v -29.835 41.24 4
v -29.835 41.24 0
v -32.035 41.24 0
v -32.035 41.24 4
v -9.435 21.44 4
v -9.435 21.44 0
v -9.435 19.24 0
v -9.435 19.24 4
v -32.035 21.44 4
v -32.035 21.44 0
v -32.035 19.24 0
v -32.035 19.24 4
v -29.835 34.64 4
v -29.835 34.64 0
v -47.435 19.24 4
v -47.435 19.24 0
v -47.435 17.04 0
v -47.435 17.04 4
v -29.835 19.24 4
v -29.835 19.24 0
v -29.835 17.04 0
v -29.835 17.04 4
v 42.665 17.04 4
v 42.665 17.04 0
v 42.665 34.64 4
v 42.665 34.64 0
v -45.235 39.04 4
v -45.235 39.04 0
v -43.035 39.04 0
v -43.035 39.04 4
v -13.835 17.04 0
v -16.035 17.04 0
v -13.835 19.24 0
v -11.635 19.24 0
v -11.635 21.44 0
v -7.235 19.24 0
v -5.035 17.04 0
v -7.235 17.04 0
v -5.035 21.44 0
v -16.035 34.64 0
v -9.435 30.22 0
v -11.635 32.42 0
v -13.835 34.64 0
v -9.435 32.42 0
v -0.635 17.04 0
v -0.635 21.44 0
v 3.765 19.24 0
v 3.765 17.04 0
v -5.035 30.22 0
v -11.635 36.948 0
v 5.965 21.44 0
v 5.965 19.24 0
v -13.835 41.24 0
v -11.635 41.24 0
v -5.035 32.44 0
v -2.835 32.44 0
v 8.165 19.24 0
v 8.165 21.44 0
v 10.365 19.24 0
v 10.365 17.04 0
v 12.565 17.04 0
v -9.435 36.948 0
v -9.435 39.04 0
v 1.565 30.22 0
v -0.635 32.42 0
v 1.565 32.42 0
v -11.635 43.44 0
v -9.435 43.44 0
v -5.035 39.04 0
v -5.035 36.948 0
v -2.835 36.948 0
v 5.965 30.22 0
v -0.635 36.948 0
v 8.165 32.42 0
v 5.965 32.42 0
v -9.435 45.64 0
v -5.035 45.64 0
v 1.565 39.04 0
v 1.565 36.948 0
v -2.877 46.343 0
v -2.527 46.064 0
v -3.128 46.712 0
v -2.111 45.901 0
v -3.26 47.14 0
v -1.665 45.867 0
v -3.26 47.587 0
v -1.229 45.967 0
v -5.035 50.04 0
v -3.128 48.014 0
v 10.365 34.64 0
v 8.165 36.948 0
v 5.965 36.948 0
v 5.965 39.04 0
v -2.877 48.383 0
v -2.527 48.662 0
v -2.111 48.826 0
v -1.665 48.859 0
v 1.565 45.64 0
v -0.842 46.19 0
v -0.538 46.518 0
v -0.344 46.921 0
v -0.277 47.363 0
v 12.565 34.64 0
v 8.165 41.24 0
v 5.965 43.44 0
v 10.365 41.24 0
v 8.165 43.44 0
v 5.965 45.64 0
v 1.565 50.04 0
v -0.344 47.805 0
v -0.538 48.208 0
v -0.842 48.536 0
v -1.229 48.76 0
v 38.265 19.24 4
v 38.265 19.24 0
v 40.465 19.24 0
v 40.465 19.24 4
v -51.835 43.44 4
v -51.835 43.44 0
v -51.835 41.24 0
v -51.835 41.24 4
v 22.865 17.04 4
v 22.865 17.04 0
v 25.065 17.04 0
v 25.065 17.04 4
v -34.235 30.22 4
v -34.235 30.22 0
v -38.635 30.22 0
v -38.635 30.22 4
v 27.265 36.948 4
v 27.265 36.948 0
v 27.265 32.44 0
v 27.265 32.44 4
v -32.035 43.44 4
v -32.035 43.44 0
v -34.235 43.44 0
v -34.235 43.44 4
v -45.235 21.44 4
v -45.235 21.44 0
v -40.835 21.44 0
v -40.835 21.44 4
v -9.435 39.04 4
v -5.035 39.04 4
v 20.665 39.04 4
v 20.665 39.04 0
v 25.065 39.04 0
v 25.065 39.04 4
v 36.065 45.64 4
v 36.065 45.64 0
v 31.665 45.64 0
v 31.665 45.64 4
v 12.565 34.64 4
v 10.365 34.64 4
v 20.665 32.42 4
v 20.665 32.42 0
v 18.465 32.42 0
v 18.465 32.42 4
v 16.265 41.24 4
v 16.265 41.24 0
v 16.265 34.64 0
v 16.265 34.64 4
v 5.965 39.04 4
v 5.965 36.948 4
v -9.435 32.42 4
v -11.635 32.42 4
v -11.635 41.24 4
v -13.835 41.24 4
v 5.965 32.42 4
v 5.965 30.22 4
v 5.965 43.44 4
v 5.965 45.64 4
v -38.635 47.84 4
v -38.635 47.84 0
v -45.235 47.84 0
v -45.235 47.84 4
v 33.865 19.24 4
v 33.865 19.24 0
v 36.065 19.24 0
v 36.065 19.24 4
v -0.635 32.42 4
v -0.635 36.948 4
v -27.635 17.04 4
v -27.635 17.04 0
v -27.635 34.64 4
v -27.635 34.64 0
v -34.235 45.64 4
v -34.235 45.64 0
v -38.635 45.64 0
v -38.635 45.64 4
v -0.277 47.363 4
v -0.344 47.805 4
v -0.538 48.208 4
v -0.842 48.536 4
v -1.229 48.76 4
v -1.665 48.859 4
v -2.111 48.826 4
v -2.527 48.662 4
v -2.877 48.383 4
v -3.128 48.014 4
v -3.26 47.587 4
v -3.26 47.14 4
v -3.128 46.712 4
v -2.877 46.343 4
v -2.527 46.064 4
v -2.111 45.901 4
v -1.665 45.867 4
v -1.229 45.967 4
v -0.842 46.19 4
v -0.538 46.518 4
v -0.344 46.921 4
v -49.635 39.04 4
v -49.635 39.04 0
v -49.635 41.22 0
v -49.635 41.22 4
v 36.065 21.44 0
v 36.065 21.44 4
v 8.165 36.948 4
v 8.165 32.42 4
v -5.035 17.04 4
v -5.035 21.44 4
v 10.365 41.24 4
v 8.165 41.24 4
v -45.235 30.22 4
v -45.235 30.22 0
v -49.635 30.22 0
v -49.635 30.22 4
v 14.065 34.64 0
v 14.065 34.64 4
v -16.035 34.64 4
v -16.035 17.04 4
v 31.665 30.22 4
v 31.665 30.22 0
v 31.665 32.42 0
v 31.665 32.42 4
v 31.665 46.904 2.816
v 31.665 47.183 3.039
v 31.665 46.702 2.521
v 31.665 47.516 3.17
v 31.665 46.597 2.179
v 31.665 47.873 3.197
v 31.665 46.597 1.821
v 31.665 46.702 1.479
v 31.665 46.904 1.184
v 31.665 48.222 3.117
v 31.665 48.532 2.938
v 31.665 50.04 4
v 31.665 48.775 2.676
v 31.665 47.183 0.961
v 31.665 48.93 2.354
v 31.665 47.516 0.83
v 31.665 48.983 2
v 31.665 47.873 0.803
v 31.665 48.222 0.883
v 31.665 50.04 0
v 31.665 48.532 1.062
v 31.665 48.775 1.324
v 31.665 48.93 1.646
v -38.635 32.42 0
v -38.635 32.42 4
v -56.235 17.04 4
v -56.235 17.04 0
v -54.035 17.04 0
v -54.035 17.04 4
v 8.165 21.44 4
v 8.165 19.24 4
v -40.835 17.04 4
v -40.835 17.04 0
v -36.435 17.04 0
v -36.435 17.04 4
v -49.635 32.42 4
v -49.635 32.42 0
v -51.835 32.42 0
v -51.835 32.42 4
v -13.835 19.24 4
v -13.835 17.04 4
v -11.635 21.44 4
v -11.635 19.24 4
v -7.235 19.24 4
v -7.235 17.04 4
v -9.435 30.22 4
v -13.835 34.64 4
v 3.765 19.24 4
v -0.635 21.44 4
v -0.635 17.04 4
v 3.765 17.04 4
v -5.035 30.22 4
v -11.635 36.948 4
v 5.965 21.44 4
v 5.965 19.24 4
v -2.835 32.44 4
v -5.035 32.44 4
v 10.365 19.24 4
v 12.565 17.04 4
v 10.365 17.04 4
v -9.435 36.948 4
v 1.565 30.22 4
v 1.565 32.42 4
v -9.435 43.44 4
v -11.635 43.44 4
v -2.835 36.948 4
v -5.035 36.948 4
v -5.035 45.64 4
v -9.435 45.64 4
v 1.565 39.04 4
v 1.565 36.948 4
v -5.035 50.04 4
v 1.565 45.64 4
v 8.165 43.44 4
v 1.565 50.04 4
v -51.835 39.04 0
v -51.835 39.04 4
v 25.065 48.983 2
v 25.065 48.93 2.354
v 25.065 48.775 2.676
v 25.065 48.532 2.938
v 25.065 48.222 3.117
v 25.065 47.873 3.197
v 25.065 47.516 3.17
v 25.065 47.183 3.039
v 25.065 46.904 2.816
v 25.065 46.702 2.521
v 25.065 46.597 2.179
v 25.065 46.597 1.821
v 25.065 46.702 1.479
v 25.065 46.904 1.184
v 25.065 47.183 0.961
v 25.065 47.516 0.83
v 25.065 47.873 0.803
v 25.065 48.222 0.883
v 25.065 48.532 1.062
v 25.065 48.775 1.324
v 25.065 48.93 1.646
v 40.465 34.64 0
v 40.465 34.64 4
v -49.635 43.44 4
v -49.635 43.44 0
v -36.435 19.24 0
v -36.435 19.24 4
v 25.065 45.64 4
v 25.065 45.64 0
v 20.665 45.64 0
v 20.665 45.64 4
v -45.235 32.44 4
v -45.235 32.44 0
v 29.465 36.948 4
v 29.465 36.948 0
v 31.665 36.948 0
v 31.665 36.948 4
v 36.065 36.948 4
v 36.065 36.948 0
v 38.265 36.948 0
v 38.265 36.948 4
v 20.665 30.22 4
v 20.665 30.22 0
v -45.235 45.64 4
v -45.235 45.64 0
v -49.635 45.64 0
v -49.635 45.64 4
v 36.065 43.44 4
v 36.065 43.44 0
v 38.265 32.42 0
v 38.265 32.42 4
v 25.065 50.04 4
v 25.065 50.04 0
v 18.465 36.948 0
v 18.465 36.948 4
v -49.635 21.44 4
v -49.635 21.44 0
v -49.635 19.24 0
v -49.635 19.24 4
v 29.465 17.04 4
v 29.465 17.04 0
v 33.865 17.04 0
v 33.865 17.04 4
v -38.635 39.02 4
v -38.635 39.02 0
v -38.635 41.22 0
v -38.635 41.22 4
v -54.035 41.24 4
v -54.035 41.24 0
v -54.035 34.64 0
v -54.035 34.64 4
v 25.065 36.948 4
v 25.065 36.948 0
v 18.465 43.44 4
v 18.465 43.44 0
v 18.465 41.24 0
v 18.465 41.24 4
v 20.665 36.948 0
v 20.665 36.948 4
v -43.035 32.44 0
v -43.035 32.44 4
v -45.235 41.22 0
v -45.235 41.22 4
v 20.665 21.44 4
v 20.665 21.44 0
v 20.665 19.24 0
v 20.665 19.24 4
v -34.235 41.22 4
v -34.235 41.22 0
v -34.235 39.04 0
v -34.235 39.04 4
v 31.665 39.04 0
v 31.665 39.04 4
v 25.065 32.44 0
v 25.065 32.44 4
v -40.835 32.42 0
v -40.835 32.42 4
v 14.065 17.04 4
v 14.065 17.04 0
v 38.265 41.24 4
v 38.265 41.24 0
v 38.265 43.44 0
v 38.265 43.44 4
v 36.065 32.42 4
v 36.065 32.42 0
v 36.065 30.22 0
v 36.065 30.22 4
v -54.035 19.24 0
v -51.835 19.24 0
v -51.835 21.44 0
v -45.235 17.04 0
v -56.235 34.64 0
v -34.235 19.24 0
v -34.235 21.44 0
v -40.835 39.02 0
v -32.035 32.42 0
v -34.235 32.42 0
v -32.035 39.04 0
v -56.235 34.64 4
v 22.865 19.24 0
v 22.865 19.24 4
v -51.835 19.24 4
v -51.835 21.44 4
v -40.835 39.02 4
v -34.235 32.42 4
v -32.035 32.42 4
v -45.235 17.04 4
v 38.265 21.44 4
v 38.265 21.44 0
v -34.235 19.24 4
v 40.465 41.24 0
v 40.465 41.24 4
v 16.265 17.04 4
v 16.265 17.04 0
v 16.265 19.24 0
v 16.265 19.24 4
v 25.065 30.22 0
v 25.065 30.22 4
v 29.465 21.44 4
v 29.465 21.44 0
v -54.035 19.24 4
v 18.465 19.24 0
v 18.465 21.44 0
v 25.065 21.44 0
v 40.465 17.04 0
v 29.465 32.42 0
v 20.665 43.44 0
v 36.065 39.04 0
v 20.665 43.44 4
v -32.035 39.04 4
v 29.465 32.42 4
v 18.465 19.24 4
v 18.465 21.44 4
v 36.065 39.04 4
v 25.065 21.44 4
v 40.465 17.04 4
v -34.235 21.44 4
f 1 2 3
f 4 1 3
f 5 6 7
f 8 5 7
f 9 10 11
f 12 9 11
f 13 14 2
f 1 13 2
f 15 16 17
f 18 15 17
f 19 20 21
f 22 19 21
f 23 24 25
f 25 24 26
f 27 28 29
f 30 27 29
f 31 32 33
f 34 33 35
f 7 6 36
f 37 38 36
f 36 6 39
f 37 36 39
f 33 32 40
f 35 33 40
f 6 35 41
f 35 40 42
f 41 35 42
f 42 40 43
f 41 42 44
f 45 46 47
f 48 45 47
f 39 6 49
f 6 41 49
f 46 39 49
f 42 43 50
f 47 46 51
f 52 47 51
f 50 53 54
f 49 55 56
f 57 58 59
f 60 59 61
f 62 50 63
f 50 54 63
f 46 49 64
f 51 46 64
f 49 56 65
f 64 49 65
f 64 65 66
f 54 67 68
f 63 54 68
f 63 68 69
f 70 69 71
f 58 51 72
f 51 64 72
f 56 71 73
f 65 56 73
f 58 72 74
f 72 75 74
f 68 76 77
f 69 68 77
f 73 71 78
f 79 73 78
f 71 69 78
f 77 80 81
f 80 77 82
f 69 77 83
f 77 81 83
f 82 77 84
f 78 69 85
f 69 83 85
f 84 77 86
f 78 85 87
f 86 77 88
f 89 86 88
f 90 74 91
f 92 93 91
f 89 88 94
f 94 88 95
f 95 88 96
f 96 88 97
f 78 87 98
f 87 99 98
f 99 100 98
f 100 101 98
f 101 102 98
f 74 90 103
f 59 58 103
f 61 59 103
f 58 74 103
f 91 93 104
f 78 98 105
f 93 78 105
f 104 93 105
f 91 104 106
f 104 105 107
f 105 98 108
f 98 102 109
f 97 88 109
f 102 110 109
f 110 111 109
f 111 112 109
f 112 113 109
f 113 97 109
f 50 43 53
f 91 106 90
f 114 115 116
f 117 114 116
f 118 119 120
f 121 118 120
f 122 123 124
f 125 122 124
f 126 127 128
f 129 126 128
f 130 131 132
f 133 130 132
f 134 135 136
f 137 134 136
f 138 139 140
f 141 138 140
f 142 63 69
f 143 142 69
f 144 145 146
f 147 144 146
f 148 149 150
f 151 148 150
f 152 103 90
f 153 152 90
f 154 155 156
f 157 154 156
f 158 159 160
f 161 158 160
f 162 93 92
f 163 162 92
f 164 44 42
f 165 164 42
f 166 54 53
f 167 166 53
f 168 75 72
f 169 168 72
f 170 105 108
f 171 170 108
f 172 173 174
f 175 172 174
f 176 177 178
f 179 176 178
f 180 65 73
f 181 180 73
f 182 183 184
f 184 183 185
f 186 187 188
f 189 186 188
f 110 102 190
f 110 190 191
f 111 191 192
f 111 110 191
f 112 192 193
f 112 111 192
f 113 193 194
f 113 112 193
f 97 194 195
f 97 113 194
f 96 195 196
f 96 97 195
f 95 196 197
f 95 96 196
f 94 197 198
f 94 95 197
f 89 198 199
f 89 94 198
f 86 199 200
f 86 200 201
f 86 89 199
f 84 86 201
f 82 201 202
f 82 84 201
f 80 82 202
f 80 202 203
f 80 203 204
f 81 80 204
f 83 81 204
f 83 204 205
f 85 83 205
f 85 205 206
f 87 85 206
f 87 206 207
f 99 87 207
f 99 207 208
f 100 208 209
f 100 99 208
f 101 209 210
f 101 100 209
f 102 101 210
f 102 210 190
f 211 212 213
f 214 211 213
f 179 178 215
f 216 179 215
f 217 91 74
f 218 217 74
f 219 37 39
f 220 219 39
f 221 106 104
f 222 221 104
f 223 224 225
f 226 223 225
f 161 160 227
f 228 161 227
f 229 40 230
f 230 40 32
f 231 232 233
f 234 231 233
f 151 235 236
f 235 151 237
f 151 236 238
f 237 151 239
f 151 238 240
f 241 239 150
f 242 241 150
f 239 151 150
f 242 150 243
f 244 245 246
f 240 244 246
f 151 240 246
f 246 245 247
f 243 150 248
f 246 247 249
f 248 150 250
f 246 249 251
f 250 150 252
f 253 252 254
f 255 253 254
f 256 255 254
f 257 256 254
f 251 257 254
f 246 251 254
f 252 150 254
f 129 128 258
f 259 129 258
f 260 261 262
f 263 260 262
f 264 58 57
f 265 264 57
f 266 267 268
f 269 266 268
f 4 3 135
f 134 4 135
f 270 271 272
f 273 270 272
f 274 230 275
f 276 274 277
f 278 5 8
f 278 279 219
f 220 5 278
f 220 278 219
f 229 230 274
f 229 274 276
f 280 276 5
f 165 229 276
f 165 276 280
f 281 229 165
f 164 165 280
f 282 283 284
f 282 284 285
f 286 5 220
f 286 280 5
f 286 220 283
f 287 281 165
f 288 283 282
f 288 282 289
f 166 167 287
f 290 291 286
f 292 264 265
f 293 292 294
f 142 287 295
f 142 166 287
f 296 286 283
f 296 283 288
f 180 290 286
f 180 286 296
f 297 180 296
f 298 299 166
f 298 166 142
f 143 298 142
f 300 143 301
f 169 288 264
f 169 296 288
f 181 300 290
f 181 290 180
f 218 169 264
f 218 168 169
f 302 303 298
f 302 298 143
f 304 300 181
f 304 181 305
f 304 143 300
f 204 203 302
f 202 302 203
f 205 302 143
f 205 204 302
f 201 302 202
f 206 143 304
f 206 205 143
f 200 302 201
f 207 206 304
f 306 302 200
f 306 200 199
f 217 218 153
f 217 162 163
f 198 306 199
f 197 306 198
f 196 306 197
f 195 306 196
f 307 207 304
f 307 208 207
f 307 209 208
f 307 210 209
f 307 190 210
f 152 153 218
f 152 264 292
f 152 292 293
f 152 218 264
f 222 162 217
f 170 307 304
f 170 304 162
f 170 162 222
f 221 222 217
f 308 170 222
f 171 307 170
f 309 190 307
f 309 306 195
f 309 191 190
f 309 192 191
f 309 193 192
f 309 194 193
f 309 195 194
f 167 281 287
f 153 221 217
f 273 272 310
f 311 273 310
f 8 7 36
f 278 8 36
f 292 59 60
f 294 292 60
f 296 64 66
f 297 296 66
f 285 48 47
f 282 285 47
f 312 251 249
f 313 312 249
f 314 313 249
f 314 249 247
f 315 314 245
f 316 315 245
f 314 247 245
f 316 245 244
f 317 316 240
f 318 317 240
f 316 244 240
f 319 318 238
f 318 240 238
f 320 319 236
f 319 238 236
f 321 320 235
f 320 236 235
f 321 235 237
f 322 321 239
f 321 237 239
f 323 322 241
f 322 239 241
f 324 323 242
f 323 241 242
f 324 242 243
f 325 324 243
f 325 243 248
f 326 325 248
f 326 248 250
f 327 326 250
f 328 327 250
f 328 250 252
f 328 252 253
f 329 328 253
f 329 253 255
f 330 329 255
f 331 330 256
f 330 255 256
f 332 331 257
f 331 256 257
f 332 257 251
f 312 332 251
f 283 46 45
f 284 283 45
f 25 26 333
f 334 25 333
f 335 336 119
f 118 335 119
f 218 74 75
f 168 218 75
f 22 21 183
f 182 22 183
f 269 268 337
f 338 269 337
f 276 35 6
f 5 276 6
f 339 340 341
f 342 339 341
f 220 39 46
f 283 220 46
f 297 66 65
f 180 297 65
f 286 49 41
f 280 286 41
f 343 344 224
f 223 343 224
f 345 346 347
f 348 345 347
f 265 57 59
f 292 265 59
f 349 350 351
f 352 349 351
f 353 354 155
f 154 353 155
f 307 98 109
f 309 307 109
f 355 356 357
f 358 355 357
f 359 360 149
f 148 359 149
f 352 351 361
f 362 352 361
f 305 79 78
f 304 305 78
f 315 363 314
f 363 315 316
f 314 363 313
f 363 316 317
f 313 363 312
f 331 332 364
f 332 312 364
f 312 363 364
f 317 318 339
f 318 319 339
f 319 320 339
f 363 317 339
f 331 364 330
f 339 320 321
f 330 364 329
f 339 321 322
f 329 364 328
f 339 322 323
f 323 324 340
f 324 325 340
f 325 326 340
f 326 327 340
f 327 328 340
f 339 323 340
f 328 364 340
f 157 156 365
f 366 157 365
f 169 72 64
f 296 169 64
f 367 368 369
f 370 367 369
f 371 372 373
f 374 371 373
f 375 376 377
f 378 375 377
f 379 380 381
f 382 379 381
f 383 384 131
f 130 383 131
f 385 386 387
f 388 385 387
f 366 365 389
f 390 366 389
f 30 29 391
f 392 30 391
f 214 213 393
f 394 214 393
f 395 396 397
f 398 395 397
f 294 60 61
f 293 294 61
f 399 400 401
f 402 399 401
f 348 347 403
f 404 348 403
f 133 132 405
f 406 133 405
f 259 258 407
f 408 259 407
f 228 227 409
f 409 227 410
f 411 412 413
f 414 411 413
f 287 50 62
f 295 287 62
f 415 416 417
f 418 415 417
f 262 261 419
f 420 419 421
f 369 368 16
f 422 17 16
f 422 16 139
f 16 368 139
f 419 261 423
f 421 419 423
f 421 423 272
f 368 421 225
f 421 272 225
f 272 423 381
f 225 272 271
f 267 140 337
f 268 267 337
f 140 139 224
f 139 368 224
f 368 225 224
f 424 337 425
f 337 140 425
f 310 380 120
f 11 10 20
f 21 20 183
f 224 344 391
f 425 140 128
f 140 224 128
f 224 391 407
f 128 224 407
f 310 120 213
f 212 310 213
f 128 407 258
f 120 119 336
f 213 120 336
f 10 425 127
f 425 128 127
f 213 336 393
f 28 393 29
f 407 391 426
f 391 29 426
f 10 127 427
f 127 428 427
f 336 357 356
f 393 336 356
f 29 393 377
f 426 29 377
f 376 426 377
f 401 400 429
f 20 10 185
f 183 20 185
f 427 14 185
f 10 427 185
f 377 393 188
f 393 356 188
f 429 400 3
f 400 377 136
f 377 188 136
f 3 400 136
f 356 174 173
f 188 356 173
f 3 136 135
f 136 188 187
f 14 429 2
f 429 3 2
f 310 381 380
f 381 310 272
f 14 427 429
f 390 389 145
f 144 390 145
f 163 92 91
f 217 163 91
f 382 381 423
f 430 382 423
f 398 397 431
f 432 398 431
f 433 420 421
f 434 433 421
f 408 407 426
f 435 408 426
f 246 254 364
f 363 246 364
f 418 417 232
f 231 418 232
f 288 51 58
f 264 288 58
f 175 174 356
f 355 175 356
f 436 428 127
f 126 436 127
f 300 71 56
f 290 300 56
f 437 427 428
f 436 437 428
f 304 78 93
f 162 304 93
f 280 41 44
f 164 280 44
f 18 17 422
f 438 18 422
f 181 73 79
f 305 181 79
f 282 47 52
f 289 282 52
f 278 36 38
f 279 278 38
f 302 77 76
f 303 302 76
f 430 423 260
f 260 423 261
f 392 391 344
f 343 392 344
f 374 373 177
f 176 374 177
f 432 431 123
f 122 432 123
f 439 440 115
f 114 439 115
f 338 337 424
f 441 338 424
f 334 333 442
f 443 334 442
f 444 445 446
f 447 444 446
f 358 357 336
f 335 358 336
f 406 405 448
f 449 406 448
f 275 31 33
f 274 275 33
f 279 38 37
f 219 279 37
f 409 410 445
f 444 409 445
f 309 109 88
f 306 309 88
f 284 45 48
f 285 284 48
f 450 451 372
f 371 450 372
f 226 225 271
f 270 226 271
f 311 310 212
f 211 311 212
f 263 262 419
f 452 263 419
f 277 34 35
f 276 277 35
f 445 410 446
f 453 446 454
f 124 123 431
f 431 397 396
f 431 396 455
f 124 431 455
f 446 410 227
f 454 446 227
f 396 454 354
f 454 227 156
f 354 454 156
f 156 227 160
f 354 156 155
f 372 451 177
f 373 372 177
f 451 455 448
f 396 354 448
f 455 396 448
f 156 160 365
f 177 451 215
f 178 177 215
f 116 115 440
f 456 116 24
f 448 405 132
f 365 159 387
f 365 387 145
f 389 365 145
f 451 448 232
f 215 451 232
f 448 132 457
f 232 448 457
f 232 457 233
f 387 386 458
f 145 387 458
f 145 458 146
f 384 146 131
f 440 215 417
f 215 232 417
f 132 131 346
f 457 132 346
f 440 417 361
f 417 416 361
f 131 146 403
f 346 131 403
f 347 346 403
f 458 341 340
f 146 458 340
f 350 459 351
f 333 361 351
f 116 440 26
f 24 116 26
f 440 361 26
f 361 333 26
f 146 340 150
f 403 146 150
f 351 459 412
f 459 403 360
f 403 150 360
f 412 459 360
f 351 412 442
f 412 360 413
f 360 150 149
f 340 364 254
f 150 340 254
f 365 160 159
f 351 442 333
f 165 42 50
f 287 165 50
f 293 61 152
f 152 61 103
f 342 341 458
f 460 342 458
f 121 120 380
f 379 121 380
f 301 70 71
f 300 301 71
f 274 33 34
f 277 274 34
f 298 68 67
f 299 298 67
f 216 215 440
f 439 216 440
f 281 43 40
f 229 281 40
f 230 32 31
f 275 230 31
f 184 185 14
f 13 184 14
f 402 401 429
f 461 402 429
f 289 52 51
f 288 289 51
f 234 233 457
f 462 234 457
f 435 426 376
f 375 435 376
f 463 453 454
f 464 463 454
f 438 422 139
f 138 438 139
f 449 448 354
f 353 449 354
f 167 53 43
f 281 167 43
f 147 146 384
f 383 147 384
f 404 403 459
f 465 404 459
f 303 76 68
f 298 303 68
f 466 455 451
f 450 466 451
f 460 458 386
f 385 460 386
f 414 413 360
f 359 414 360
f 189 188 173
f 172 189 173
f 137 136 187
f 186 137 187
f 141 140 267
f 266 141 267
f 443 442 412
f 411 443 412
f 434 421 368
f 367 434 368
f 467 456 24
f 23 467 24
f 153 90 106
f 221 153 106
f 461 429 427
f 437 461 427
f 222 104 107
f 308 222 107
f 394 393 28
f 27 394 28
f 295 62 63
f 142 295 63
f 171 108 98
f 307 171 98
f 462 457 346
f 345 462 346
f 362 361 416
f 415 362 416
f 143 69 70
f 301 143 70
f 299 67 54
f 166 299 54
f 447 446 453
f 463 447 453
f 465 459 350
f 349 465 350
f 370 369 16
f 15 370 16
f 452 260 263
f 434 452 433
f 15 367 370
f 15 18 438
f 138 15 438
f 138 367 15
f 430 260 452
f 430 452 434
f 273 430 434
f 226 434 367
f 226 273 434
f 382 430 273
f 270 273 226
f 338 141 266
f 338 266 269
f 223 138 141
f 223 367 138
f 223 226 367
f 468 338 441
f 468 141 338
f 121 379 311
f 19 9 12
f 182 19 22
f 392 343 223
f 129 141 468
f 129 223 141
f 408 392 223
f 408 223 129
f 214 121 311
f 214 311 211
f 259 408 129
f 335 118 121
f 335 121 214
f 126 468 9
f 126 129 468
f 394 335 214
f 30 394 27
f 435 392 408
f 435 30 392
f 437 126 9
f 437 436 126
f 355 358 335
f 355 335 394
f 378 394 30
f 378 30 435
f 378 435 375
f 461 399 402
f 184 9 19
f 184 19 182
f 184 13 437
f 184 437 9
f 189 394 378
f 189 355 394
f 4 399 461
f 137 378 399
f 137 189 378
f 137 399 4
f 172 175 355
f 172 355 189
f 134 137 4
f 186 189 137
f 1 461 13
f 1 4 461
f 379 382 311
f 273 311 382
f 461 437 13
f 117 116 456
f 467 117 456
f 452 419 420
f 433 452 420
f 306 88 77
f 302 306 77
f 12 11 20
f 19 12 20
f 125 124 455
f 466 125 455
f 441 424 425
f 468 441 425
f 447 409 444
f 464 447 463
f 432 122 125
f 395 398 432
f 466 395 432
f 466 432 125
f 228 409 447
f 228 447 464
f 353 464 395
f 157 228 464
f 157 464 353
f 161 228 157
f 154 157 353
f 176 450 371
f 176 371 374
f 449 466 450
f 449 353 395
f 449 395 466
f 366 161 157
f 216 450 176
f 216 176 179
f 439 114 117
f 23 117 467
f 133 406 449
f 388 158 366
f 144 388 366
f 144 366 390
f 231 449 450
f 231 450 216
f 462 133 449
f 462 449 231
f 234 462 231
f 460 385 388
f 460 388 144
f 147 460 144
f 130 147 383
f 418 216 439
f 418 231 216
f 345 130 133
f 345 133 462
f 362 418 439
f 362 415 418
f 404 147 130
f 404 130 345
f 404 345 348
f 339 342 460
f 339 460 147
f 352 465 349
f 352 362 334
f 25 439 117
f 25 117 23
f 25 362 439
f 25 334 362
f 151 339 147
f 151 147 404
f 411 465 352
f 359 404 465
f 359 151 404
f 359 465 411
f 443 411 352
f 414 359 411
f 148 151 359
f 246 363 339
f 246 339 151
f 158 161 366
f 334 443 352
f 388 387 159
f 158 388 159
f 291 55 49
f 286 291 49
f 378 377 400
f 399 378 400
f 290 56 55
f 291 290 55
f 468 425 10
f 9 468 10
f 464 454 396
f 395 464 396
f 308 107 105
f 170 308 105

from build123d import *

# Parameters (mm, degrees)
F1_DEPTH = 4
F0_R     = 1.5
F2_R     = 1.2
F3_DEPTH = 6.6


with BuildPart() as f1:
    # F0 (on Top) → F1 (new body)
    with BuildSketch(Plane.XY):
        Polygon((-49.635447526, 43.4403642893), (-51.835447526, 43.4403642893), (-51.835447526, 41.2403642893), (-54.035447526, 41.2403642893), (-54.035447526, 34.6403642893), (-56.235447526, 34.6403642893), (-56.235447526, 17.0403642893), (-54.035447526, 17.0403642893), (-54.035447526, 19.2403642893), (-51.835447526, 19.2403642893), (-51.835447526, 21.4403642893), (-49.635447526, 21.4403642893), (-49.635447526, 19.2403642893), (-47.435447526, 19.2403642893), (-47.435447526, 17.0403642893), (-45.235447526, 17.0403642893), (-45.235447526, 21.4403642893), (-40.835447526, 21.4403642893), (-40.835447526, 17.0403642893), (-36.435447526, 17.0403642893), (-36.435447526, 19.2403642893), (-34.235447526, 19.2403642893), (-34.235447526, 21.4403642893), (-32.035447526, 21.4403642893), (-32.035447526, 19.2403642893), (-29.835447526, 19.2403642893), (-29.835447526, 17.0403642893), (-27.635447526, 17.0403642893), (-27.635447526, 34.6403642893), (-29.835447526, 34.6403642893), (-29.835447526, 41.2403642893), (-32.035447526, 41.2403642893), (-32.035447526, 43.4403642893), (-34.235447526, 43.4403642893), (-34.235447526, 45.6403642893), (-38.635447526, 45.6403642893), (-38.635447526, 47.8403642893), (-45.235447526, 47.8403642893), (-45.235447526, 45.6403642893), (-49.635447526, 45.6403642893), align=None)
        Polygon((-45.235447526, 41.2196852863), (-45.235447526, 39.0403642893), (-43.035447526, 39.0403642893), (-43.035447526, 39.0196852863), (-43.035447526, 32.4403642893), (-45.235447526, 32.4403642893), (-45.235447526, 30.2196852863), (-49.635447526, 30.2196852863), (-49.635447526, 32.4196852863), (-51.835447526, 32.4196852863), (-51.835447526, 32.4403642893), (-51.835447526, 39.0196852863), (-51.835447526, 39.0403642893), (-49.635447526, 39.0403642893), (-49.635447526, 41.2196852863), align=None, mode=Mode.SUBTRACT)
        Polygon((-34.235447526, 39.0403642893), (-32.035447526, 39.0403642893), (-32.035447526, 39.0196852863), (-32.035447526, 32.4403642893), (-32.035447526, 32.4196852863), (-34.235447526, 32.4196852863), (-34.235447526, 30.2196852863), (-38.635447526, 30.2196852863), (-38.635447526, 32.4196852863), (-40.835447526, 32.4196852863), (-40.835447526, 39.0196852863), (-38.635447526, 39.0196852863), (-38.635447526, 39.0403642893), (-38.635447526, 41.2196852863), (-34.235447526, 41.2196852863), align=None, mode=Mode.SUBTRACT)
    extrude(amount=F1_DEPTH)


with BuildPart() as f1b:
    # F0 (on Top) → F1, piece 2 (new body)
    with BuildSketch(Plane.XY):
        Polygon((-9.4354487598, 43.4403642893), (-11.6354487598, 43.4403642893), (-11.6354487598, 41.2403642893), (-13.8354487598, 41.2403642893), (-13.8354487598, 34.6403642893), (-16.0354487598, 34.6403642893), (-16.0354487598, 17.0403642893), (-13.8354487598, 17.0403642893), (-13.8354487598, 19.2403642893), (-11.6354487598, 19.2403642893), (-11.6354487598, 21.4403642893), (-9.4354487598, 21.4403642893), (-9.4354487598, 19.2403642893), (-7.2354487598, 19.2403642893), (-7.2354487598, 17.0403642893), (-5.0354487598, 17.0403642893), (-5.0354487598, 21.4403642893), (-0.6354487598, 21.4403642893), (-0.6354487598, 17.0403642893), (3.7645512402, 17.0403642893), (3.7645512402, 19.2403642893), (5.9645512402, 19.2403642893), (5.9645512402, 21.4403642893), (8.1645512402, 21.4403642893), (8.1645512402, 19.2403642893), (10.3645512402, 19.2403642893), (10.3645512402, 17.0403642893), (12.5645512402, 17.0403642893), (12.5645512402, 34.6403642893), (10.3645512402, 34.6403642893), (10.3645512402, 41.2403642893), (8.1645512402, 41.2403642893), (8.1645512402, 43.4403642893), (5.9645512402, 43.4403642893), (5.9645512402, 45.6403642893), (1.5645512402, 45.6403642893), (1.5645512402, 47.8403642893), (1.5645512402, 50.0403642893), (-5.0354487598, 50.0403642893), (-5.0354487598, 47.8403642893), (-5.0354487598, 45.6403642893), (-9.4354487598, 45.6403642893), align=None)
        Polygon((-5.0354487598, 36.9481220841), (-2.8354487598, 36.9481220841), (-2.8354487598, 32.4403642893), (-5.0354487598, 32.4403642893), (-5.0354487598, 30.2196852863), (-9.4354487598, 30.2196852863), (-9.4354487598, 32.4196852863), (-11.6354487598, 32.4196852863), (-11.6354487598, 32.4403642893), (-11.6354487598, 36.9481220841), (-9.4354487598, 36.9481220841), (-9.4354487598, 39.0196852863), (-9.4354487598, 39.0403642893), (-7.2354487598, 39.0403642893), (-5.0354487598, 39.0403642893), (-5.0354487598, 39.0196852863), align=None, mode=Mode.SUBTRACT)
        Polygon((5.9645512402, 36.9481220841), (8.1645512402, 36.9481220841), (8.1645512402, 32.4403642893), (8.1645512402, 32.4196852863), (5.9645512402, 32.4196852863), (5.9645512402, 30.2196852863), (1.5645512402, 30.2196852863), (1.5645512402, 32.4196852863), (-0.6354487598, 32.4196852863), (-0.6354487598, 36.9481220841), (1.5645512402, 36.9481220841), (1.5645512402, 39.0196852863), (1.5645512402, 39.0403642893), (5.9645512402, 39.0403642893), (5.9645512402, 39.0196852863), align=None, mode=Mode.SUBTRACT)
        with Locations((-1.7769553233, 47.363191843)):
            Circle(F0_R, mode=Mode.SUBTRACT)
    extrude(amount=F1_DEPTH)


with BuildPart() as f1c:
    # F0 (on Top) → F1, piece 3 (new body)
    with BuildSketch(Plane.XY):
        Polygon((20.6645513311, 43.4403642893), (18.4645513311, 43.4403642893), (18.4645513311, 41.2403642893), (16.2645513311, 41.2403642893), (16.2645513311, 34.6403642893), (14.0645513311, 34.6403642893), (14.0645513311, 17.0403642893), (16.2645513311, 17.0403642893), (16.2645513311, 19.2403642893), (18.4645513311, 19.2403642893), (18.4645513311, 21.4403642893), (20.6645513311, 21.4403642893), (20.6645513311, 19.2403642893), (22.8645513311, 19.2403642893), (22.8645513311, 17.0403642893), (25.0645513311, 17.0403642893), (25.0645513311, 21.4403642893), (29.4645513311, 21.4403642893), (29.4645513311, 17.0403642893), (33.8645513311, 17.0403642893), (33.8645513311, 19.2403642893), (36.0645513311, 19.2403642893), (36.0645513311, 21.4403642893), (38.2645513311, 21.4403642893), (38.2645513311, 19.2403642893), (40.4645513311, 19.2403642893), (40.4645513311, 17.0403642893), (42.6645513311, 17.0403642893), (42.6645513311, 34.6403642893), (40.4645513311, 34.6403642893), (40.4645513311, 41.2403642893), (38.2645513311, 41.2403642893), (38.2645513311, 43.4403642893), (36.0645513311, 43.4403642893), (36.0645513311, 45.6403642893), (31.6645513311, 45.6403642893), (31.6645513311, 47.8403642893), (31.6645513311, 50.0403642893), (25.0645513311, 50.0403642893), (25.0645513311, 47.8403642893), (25.0645513311, 45.6403642893), (20.6645513311, 45.6403642893), align=None)
        Polygon((25.0645513311, 36.9481220841), (27.2645513311, 36.9481220841), (27.2645513311, 32.4403642893), (25.0645513311, 32.4403642893), (25.0645513311, 30.2196852863), (20.6645513311, 30.2196852863), (20.6645513311, 32.4196852863), (18.4645513311, 32.4196852863), (18.4645513311, 32.4403642893), (18.4645513311, 36.9481220841), (20.6645513311, 36.9481220841), (20.6645513311, 39.0196852863), (20.6645513311, 39.0403642893), (22.8645513311, 39.0403642893), (25.0645513311, 39.0403642893), (25.0645513311, 39.0196852863), align=None, mode=Mode.SUBTRACT)
        Polygon((36.0645513311, 36.9481220841), (38.2645513311, 36.9481220841), (38.2645513311, 32.4403642893), (38.2645513311, 32.4196852863), (36.0645513311, 32.4196852863), (36.0645513311, 30.2196852863), (31.6645513311, 30.2196852863), (31.6645513311, 32.4196852863), (29.4645513311, 32.4196852863), (29.4645513311, 36.9481220841), (31.6645513311, 36.9481220841), (31.6645513311, 39.0196852863), (31.6645513311, 39.0403642893), (36.0645513311, 39.0403642893), (36.0645513311, 39.0196852863), align=None, mode=Mode.SUBTRACT)
    extrude(amount=F1_DEPTH)

    # F2 (on face) → F3 (cut, through all)
    with BuildSketch(Plane.YZ.offset(31.6645513311)):
        with Locations((47.7834865451, 2)):
            Circle(F2_R)
    extrude(amount=-F3_DEPTH, mode=Mode.SUBTRACT)


solid = Compound([f1.part, f1b.part, f1c.part])
